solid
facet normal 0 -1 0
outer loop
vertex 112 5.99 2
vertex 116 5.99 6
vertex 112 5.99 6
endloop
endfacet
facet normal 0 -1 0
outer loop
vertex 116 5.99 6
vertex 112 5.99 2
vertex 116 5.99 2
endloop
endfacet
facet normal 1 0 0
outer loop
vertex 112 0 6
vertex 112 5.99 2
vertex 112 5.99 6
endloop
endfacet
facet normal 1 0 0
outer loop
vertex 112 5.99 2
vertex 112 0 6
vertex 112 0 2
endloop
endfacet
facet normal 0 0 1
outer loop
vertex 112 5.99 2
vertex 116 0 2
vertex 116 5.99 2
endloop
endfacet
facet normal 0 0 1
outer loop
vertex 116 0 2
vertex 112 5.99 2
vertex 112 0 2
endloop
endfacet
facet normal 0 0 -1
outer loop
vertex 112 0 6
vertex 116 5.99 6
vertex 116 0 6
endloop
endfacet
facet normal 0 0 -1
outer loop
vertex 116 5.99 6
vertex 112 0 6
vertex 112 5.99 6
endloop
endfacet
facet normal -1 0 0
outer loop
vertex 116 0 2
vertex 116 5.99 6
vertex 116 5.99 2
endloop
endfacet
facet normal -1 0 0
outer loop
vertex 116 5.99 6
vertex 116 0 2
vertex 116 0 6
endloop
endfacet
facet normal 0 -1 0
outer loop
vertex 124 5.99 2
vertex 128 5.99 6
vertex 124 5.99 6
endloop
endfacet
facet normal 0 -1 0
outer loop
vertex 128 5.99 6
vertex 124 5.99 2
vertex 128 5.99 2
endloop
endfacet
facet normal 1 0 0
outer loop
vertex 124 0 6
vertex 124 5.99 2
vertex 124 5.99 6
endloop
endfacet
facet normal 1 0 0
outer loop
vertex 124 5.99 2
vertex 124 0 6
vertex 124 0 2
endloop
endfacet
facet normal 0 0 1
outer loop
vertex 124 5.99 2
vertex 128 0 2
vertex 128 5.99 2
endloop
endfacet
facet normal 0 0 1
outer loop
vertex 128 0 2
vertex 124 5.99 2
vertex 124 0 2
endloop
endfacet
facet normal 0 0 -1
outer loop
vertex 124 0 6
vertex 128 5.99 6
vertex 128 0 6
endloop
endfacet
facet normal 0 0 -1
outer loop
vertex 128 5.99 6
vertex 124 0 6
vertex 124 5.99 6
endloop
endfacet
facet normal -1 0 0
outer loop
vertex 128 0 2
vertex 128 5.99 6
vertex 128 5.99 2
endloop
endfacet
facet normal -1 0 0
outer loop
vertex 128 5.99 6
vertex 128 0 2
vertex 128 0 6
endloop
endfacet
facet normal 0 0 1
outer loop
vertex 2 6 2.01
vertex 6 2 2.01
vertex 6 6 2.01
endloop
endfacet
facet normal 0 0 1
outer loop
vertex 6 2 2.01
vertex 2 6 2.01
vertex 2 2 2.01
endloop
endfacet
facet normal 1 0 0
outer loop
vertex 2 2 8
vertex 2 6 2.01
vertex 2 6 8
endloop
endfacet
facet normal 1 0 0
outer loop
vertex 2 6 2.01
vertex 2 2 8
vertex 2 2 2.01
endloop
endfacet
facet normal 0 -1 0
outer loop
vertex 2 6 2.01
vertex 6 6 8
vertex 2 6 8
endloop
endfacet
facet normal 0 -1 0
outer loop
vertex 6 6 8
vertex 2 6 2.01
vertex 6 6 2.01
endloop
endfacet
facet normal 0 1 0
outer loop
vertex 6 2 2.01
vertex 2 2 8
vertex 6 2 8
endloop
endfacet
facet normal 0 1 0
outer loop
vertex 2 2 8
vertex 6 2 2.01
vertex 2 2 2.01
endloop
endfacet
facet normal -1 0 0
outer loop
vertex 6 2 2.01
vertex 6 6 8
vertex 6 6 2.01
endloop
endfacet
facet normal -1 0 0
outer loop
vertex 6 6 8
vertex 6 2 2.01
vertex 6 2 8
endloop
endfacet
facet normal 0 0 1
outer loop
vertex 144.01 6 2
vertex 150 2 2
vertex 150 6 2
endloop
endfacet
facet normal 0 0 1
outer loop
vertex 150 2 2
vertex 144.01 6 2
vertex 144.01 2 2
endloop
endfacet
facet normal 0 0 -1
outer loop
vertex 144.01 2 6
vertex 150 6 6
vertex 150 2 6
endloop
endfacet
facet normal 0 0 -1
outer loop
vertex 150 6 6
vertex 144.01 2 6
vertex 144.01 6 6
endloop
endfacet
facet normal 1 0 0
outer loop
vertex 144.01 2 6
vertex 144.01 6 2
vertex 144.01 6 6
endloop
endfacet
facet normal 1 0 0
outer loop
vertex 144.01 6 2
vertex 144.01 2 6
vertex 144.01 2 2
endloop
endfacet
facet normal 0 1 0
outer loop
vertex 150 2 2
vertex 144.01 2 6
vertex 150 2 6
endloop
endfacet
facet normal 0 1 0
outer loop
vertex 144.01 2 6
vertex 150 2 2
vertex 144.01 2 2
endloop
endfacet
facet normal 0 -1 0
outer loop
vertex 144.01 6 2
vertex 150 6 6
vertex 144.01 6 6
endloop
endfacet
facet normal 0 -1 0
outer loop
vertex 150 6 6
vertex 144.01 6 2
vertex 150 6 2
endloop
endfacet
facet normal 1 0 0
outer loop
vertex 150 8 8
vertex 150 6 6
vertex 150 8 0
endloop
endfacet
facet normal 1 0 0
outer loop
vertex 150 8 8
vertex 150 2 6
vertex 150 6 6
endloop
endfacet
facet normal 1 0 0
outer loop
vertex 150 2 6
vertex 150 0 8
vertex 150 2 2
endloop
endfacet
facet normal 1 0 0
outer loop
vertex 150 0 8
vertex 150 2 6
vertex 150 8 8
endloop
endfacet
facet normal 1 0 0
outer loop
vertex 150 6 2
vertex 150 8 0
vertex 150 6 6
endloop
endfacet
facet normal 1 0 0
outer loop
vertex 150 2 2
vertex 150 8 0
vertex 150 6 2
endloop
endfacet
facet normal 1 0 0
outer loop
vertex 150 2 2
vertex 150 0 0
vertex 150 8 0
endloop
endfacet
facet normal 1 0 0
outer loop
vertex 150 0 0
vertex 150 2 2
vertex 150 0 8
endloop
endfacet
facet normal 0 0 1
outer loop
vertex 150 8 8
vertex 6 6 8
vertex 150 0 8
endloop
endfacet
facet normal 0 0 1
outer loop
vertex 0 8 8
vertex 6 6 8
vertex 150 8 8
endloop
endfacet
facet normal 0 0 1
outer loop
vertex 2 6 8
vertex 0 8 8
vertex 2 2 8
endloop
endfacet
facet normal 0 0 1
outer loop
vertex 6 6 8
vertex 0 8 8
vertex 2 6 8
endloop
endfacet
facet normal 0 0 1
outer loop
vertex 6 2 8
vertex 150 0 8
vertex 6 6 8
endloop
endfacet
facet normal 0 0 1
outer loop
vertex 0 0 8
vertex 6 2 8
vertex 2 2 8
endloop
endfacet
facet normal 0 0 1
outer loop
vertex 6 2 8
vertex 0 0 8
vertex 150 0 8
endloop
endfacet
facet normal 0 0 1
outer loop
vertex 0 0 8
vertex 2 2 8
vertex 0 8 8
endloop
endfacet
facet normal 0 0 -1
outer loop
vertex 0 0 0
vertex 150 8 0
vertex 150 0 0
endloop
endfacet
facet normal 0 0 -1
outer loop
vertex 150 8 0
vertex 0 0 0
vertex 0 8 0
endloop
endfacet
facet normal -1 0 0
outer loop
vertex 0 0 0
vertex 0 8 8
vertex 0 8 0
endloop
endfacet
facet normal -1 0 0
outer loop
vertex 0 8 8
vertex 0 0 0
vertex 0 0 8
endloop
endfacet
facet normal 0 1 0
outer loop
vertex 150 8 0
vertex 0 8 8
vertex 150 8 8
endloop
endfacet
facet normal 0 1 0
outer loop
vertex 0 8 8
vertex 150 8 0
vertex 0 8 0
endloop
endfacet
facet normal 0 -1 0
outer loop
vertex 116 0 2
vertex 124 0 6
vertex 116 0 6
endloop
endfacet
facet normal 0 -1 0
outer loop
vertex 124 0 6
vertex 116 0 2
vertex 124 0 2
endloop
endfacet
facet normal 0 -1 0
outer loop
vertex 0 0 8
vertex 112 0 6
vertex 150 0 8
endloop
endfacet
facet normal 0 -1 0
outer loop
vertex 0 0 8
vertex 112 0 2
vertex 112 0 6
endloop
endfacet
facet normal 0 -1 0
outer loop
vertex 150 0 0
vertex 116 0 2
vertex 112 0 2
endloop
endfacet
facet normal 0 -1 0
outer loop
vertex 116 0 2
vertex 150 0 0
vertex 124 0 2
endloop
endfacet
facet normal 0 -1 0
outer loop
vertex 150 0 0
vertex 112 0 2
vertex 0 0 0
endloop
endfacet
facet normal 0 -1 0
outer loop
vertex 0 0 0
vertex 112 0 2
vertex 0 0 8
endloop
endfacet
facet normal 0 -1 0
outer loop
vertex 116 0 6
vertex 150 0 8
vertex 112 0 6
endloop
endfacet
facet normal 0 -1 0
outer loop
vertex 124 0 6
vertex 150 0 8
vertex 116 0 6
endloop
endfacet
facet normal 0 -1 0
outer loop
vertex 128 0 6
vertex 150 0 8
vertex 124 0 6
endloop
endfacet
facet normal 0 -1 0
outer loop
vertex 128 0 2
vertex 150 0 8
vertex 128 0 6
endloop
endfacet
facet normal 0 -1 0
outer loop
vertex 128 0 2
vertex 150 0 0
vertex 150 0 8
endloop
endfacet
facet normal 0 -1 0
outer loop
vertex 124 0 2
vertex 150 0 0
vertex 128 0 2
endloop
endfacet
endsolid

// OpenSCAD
// file: connector.scad
include <common.scad>

module connector_pin() {
    translate([0, 0, (CONNECTOR_DEPTH - LOOSE_FIT) / 2])
        cube([CONNECTOR_WIDTH, CONNECTOR_WIDTH, CONNECTOR_DEPTH - LOOSE_FIT], center = true);
}

module connector_hole() {
    translate([0, 0, CONNECTOR_DEPTH / 2])
        cube([CONNECTOR_WIDTH, CONNECTOR_WIDTH, CONNECTOR_DEPTH], center = true);
}
// file: common.scad
$fa = 1;
$fs = .4;

// Fit tolerances
PRESS_FIT = 0;
TIGHT_FIT = .13;
NORMAL_FIT = .250;
LOOSE_FIT = .5;

DELTA = .01;

// Bar
BAR_LENGTH = 150;
BAR_WIDTH = 8;

// Connector
CONNECTOR_WIDTH = 4;
CONNECTOR_DEPTH = 6;

// Clip
CLIP_HOLE_R = 8;
CLIP_WALL = 4;
CLIP_REDUCE = 1;
CLIP_ANGLE = 30;

// Clip positition
BAR_CLIP_POS = 120;
// main file
include <common.scad>;
include <connector.scad>;

body_r = CLIP_HOLE_R + CLIP_WALL;

difference() {
    // Bar body
    cube([BAR_LENGTH, BAR_WIDTH, BAR_WIDTH]);

    union() {
        // Connector holes for the clip
        translate([BAR_CLIP_POS - body_r / 2, -DELTA, BAR_WIDTH / 2])
            rotate([-90, 0, 0])
                connector_hole();

        translate([BAR_CLIP_POS + body_r / 2, -DELTA, BAR_WIDTH / 2])
            rotate([-90, 0, 0])
                connector_hole();

        // Connector hole for potential 90 degree rear bar
        translate([BAR_WIDTH / 2, BAR_WIDTH / 2, BAR_WIDTH + DELTA])
            rotate([180, 0, 0])
                connector_hole();

        // Connector hole for front half of the bar
        translate([BAR_LENGTH + DELTA, BAR_WIDTH / 2, BAR_WIDTH / 2])
            rotate([0, -90, 0])
                connector_hole();
    }
}
